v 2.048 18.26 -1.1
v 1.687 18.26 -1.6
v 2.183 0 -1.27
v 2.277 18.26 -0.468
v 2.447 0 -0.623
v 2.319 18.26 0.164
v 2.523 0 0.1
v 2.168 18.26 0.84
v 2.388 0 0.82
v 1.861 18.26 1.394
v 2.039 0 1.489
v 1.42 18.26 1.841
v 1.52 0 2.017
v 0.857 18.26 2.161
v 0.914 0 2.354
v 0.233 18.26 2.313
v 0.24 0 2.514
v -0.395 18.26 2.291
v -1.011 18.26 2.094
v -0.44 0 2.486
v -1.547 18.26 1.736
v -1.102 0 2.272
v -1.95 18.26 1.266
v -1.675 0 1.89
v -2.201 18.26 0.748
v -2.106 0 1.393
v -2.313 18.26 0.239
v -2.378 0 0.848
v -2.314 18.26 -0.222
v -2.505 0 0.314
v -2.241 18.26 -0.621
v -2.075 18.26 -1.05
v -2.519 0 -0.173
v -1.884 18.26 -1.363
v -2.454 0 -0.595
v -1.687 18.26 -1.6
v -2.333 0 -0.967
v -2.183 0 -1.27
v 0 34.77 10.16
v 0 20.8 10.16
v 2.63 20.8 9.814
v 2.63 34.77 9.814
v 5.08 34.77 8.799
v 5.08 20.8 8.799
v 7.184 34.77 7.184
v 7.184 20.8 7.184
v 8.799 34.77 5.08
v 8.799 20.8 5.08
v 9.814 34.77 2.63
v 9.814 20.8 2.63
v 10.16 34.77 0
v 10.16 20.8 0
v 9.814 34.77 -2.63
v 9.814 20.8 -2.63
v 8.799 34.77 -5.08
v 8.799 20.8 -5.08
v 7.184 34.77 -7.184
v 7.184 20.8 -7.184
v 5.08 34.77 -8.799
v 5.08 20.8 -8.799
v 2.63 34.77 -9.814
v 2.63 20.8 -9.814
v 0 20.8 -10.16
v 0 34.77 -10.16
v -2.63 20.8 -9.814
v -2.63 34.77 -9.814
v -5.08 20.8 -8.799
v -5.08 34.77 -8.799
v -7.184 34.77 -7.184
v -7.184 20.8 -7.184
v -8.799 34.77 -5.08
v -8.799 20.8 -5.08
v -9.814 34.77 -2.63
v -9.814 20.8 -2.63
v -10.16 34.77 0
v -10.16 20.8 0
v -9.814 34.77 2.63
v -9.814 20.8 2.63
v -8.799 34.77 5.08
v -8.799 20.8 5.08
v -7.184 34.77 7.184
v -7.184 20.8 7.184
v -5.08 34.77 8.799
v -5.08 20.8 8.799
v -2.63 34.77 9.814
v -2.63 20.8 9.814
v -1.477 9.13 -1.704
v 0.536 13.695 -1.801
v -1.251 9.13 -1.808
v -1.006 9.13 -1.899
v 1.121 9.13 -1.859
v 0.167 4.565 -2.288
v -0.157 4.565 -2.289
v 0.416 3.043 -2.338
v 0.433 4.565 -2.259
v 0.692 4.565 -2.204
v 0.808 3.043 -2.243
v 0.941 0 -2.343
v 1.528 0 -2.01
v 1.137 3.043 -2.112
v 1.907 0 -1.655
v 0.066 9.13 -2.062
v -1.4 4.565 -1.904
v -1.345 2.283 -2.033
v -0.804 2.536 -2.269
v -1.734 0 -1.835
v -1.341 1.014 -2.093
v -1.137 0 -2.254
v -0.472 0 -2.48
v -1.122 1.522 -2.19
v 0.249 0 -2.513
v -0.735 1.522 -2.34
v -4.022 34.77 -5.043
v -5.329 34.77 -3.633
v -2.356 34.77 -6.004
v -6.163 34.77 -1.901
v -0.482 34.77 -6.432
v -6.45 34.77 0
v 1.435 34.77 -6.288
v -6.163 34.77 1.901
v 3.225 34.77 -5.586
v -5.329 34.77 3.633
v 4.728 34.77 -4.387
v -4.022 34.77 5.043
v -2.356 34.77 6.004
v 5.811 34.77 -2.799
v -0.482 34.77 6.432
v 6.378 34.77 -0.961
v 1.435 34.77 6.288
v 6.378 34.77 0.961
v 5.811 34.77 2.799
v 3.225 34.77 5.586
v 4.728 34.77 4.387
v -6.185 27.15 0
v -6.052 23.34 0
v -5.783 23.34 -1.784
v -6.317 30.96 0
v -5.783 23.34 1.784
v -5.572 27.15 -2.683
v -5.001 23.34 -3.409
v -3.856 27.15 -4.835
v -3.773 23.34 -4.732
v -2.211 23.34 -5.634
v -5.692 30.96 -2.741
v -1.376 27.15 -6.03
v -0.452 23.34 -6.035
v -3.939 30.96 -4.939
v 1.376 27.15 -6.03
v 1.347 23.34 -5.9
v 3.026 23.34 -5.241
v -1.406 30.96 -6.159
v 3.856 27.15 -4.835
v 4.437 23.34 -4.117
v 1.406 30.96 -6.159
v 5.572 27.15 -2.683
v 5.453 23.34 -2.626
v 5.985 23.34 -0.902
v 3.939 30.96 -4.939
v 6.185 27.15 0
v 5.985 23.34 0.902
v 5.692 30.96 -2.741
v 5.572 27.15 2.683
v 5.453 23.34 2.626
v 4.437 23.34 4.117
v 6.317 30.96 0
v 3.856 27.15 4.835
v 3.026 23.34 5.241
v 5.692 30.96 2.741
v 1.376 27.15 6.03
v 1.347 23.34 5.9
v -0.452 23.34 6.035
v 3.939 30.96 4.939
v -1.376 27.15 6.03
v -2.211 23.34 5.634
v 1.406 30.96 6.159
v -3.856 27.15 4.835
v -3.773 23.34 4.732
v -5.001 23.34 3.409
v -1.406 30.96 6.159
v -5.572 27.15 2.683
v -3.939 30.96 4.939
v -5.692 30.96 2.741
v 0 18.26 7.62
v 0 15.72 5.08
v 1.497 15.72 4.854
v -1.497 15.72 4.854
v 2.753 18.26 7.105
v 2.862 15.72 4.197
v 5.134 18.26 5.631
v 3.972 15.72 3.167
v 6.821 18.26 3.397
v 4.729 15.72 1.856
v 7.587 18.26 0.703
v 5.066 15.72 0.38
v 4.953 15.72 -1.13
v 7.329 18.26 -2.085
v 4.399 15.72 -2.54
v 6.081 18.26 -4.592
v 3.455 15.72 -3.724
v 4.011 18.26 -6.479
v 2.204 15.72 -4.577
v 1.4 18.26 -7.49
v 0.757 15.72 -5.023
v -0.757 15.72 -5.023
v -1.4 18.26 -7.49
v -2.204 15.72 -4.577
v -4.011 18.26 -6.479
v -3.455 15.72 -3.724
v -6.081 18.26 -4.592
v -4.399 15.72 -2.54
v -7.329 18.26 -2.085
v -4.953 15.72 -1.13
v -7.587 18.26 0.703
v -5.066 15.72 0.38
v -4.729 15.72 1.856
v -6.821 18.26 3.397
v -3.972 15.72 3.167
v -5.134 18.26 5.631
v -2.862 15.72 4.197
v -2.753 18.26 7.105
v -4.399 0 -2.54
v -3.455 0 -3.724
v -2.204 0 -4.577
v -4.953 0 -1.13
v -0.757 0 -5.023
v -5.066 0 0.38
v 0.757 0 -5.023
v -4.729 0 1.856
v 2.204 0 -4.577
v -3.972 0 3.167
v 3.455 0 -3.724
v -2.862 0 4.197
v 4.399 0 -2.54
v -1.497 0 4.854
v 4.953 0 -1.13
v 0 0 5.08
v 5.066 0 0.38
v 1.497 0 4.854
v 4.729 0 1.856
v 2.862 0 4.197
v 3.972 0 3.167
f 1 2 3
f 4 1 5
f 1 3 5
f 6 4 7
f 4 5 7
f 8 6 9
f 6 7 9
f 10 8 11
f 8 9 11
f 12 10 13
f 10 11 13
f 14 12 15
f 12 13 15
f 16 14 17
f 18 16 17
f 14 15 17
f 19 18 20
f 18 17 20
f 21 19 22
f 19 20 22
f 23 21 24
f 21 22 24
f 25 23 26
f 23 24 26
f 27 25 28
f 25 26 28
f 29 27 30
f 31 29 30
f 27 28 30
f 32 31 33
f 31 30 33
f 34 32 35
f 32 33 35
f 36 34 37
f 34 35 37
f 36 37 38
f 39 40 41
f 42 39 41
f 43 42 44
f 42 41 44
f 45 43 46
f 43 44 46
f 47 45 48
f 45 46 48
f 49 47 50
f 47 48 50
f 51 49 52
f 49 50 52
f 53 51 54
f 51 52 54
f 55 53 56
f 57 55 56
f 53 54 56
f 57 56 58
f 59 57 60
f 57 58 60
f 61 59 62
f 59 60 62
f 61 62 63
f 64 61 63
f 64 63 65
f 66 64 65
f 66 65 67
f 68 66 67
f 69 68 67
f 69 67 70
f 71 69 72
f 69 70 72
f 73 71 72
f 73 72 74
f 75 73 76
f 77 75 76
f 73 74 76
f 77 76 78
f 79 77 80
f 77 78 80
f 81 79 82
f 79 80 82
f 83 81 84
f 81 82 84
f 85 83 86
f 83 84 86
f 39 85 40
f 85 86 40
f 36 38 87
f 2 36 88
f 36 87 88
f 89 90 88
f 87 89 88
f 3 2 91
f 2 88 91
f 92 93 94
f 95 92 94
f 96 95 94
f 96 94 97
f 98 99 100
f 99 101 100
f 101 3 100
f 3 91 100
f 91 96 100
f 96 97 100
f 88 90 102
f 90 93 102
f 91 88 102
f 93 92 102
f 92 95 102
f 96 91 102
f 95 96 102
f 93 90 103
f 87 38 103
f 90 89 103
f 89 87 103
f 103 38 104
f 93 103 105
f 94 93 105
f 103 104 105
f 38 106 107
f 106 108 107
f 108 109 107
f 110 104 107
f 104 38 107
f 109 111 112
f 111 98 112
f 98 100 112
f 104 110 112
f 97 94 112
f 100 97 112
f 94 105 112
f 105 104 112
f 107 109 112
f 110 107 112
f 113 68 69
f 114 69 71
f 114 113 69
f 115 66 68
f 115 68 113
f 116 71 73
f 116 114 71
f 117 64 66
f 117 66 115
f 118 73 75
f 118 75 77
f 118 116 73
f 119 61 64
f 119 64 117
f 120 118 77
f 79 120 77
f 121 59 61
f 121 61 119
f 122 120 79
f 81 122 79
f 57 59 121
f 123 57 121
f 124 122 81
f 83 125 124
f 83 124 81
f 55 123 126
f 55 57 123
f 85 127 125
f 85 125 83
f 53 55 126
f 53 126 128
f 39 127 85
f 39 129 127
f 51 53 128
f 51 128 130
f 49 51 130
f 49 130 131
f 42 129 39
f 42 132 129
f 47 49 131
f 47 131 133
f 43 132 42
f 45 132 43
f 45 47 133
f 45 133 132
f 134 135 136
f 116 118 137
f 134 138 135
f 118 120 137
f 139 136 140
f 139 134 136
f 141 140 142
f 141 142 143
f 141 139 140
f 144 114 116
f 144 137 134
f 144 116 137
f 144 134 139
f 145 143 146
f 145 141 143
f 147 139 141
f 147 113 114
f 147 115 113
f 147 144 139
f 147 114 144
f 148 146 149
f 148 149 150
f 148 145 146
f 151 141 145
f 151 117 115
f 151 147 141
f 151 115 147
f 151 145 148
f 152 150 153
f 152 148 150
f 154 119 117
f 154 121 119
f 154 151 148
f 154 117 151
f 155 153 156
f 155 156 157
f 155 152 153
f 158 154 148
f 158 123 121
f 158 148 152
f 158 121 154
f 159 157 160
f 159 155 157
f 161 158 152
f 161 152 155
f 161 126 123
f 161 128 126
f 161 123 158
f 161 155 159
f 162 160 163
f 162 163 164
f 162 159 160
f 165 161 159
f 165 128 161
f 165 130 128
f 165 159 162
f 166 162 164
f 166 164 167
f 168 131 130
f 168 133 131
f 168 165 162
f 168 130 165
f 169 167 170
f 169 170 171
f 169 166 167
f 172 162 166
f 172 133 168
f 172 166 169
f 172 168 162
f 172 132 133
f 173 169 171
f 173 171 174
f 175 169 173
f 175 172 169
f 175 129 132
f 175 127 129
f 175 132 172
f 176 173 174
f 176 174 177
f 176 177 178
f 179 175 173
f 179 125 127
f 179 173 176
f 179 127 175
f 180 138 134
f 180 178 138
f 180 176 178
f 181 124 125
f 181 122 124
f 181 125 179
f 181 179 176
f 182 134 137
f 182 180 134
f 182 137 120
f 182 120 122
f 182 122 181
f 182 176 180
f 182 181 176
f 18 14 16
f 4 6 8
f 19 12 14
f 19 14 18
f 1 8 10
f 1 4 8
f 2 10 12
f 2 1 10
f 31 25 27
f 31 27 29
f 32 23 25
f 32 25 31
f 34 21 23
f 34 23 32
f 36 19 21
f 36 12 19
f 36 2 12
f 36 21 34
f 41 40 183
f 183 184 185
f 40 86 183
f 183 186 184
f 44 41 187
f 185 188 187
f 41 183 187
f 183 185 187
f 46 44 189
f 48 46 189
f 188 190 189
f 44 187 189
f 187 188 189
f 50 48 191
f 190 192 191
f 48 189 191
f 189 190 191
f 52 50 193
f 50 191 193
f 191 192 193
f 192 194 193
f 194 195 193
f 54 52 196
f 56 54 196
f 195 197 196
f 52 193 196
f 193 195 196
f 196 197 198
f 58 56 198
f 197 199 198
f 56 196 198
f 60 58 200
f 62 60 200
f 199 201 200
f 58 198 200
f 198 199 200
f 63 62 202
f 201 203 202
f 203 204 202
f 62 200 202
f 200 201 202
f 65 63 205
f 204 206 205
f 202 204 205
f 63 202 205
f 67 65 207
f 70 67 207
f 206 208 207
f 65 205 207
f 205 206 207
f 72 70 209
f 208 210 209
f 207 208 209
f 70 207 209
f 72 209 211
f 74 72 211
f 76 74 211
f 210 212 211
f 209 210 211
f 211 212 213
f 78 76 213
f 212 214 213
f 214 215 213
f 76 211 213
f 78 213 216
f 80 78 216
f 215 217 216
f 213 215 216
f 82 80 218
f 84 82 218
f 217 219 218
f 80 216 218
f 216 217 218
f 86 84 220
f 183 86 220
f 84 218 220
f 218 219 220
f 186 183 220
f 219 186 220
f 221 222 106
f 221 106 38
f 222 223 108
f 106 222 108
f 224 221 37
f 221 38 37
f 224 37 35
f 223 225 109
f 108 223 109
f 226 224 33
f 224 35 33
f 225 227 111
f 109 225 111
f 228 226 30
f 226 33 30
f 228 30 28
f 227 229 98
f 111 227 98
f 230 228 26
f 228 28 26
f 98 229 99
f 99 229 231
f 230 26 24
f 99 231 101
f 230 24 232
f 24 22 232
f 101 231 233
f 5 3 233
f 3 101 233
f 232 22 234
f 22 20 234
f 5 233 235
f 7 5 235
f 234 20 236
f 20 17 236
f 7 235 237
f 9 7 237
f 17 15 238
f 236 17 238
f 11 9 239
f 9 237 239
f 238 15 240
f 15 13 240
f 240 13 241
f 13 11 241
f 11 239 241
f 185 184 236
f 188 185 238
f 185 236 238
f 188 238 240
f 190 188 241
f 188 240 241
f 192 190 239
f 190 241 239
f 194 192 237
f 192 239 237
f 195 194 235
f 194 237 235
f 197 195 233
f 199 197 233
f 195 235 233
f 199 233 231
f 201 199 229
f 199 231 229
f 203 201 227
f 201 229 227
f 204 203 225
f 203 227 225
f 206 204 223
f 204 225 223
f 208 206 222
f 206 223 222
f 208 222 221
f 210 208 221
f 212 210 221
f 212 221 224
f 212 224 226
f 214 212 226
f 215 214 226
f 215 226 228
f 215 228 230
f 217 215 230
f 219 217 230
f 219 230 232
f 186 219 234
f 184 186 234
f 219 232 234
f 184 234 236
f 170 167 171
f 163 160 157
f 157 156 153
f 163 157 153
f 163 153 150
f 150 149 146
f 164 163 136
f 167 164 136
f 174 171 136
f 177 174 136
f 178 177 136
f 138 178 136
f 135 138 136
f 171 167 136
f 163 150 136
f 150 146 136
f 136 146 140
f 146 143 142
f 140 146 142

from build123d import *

# Parameters (mm, degrees)
SKETCH1_R           = 5.08
BOSS_EXTRUDE1_DEPTH = 20.8
SKETCH2_R           = 10.16
BOSS_EXTRUDE2_DEPTH = 13.97
SKETCH4_R           = 6.052157879
SKETCH3_R           = 6.450000054
CHAMFER1_SIZE       = 5.08


with BuildPart() as part:
    # Sketch1 → Boss-Extrude1 (new body)
    with BuildSketch(Plane(origin=(0, 0, 0), x_dir=(1, 0, 0), z_dir=(0, 1, 0))):
        with Locations(Location((0, 0, 0), (0, 0, 270))):
            Circle(SKETCH1_R)
    extrude(amount=BOSS_EXTRUDE1_DEPTH)

    # Sketch2 → Boss-Extrude2 (add)
    with BuildSketch(Plane(origin=(0, 20.8, 0), x_dir=(1, 0, 0), z_dir=(0, 1, 0))):
        with Locations(Location((0, 0, 0), (0, 0, 270))):
            Circle(SKETCH2_R)
    extrude(amount=BOSS_EXTRUDE2_DEPTH)

    # Sketch4 → Cut-Loft1 section 0
    with BuildSketch(Plane(origin=(0, 23.34, 0), x_dir=(-1, 0, 0), z_dir=(0, -1, 0))):
        Circle(SKETCH4_R)
    # Sketch3 → Cut-Loft1 section 1
    with BuildSketch(Plane(origin=(0, 34.77, 0), x_dir=(1, 0, 0), z_dir=(0, 1, 0))):
        Circle(SKETCH3_R)
    loft(mode=Mode.SUBTRACT)

    # Chamfer1
    chamfer1_edges = [part.edges().sort_by_distance(p)[0] for p in [
        (0, 20.8, -5.08),
    ]]
    chamfer(chamfer1_edges, length=CHAMFER1_SIZE - 0.0001)  # a hair under: the kernel refuses the full size

    # Cut-Loft2: read off the stored shape, not the designer's step
    # Cut-Loft2: loft between two sections, ruled curve by curve
    cut_loft2_from = [
        Edge.make_bspline([(-1.686897944, 18.26, -1.600000102), (-1.546323115, 18.26, -1.600000102), (-1.405748287, 18.26, -1.600000102), (-1.124598629, 18.26, -1.600000102), (-0.984023801, 18.26, -1.600000102), (-0.702874143, 18.26, -1.600000102), (-0.562299315, 18.26, -1.600000102), (-0.281149657, 18.26, -1.600000102), (-0.140574829, 18.26, -1.600000102), (0.140574829, 18.26, -1.600000102), (0.281149657, 18.26, -1.600000102), (0.562299315, 18.26, -1.600000102), (0.702874143, 18.26, -1.600000102), (0.984023801, 18.26, -1.600000102), (1.124598629, 18.26, -1.600000102), (1.405748287, 18.26, -1.600000102), (1.546323115, 18.26, -1.600000102), (1.686897944, 18.26, -1.600000102)], [0, 0, 0, 0, 0.125, 0.125, 0.25, 0.25, 0.375, 0.375, 0.5, 0.5, 0.625, 0.625, 0.75, 0.75, 0.875, 0.875, 1, 1, 1, 1], 3),
        Edge.make_bspline([(1.686897944, 18.26, -1.600000102), (3.329599086, 18.26, 0.131918024), (2.387049944, 18.26, 2.325), (-2.387049944, 18.26, 2.325), (-3.329599086, 18.26, 0.131918024), (-1.686897944, 18.26, -1.600000102)], [0, 0, 0, 0, 0.5, 0.5, 1, 1, 1, 1], 3, [1, 0.355899276, 0.212319878, 0.212319878, 0.355899276, 1]),
    ]
    cut_loft2_to = [
        Edge.make_bspline([(-2.182602074, 0, -1.269595679), (-2.091149197, 0, -1.426815211), (-1.976752522, 0, -1.584210464), (-1.696673404, 0, -1.88110943), (-1.530809339, 0, -2.020452874), (-1.151990541, 0, -2.25799133), (-0.939007592, 0, -2.355871773), (-0.483917032, 0, -2.489516293), (-0.242057859, 0, -2.525), (0.242057859, 0, -2.525), (0.483917032, 0, -2.489516293), (0.939007592, 0, -2.355871773), (1.151990541, 0, -2.25799133), (1.530809339, 0, -2.020452874), (1.696673404, 0, -1.88110943), (1.976752522, 0, -1.584210464), (2.091149197, 0, -1.426815211), (2.182602074, 0, -1.269595679)], [0, 0, 0, 0, 0.125, 0.125, 0.25, 0.25, 0.375, 0.375, 0.5, 0.5, 0.625, 0.625, 0.75, 0.75, 0.875, 0.875, 1, 1, 1, 1], 3),
        Edge.make_bspline([(2.182602074, 0, -1.269595679), (3.284684333, 0, 0.625028778), (2.191845601, 0, 2.525), (-2.191845601, 0, 2.525), (-3.284684333, 0, 0.625028778), (-2.182602074, 0, -1.269595679)], [0, 0, 0, 0, 0.5, 0.5, 1, 1, 1, 1], 3, [1, 0.4431946, 0.295047331, 0.295047331, 0.4431946, 1]),
    ]
    cut_loft2 = Solid(Shell([*[Face.make_surface_from_curves(cut_loft2_from[k], cut_loft2_to[k]) for k in range(2)], Face(Wire(cut_loft2_from)), Face(Wire(cut_loft2_to))]))
    add(cut_loft2, mode=Mode.SUBTRACT)


solid = part.part
